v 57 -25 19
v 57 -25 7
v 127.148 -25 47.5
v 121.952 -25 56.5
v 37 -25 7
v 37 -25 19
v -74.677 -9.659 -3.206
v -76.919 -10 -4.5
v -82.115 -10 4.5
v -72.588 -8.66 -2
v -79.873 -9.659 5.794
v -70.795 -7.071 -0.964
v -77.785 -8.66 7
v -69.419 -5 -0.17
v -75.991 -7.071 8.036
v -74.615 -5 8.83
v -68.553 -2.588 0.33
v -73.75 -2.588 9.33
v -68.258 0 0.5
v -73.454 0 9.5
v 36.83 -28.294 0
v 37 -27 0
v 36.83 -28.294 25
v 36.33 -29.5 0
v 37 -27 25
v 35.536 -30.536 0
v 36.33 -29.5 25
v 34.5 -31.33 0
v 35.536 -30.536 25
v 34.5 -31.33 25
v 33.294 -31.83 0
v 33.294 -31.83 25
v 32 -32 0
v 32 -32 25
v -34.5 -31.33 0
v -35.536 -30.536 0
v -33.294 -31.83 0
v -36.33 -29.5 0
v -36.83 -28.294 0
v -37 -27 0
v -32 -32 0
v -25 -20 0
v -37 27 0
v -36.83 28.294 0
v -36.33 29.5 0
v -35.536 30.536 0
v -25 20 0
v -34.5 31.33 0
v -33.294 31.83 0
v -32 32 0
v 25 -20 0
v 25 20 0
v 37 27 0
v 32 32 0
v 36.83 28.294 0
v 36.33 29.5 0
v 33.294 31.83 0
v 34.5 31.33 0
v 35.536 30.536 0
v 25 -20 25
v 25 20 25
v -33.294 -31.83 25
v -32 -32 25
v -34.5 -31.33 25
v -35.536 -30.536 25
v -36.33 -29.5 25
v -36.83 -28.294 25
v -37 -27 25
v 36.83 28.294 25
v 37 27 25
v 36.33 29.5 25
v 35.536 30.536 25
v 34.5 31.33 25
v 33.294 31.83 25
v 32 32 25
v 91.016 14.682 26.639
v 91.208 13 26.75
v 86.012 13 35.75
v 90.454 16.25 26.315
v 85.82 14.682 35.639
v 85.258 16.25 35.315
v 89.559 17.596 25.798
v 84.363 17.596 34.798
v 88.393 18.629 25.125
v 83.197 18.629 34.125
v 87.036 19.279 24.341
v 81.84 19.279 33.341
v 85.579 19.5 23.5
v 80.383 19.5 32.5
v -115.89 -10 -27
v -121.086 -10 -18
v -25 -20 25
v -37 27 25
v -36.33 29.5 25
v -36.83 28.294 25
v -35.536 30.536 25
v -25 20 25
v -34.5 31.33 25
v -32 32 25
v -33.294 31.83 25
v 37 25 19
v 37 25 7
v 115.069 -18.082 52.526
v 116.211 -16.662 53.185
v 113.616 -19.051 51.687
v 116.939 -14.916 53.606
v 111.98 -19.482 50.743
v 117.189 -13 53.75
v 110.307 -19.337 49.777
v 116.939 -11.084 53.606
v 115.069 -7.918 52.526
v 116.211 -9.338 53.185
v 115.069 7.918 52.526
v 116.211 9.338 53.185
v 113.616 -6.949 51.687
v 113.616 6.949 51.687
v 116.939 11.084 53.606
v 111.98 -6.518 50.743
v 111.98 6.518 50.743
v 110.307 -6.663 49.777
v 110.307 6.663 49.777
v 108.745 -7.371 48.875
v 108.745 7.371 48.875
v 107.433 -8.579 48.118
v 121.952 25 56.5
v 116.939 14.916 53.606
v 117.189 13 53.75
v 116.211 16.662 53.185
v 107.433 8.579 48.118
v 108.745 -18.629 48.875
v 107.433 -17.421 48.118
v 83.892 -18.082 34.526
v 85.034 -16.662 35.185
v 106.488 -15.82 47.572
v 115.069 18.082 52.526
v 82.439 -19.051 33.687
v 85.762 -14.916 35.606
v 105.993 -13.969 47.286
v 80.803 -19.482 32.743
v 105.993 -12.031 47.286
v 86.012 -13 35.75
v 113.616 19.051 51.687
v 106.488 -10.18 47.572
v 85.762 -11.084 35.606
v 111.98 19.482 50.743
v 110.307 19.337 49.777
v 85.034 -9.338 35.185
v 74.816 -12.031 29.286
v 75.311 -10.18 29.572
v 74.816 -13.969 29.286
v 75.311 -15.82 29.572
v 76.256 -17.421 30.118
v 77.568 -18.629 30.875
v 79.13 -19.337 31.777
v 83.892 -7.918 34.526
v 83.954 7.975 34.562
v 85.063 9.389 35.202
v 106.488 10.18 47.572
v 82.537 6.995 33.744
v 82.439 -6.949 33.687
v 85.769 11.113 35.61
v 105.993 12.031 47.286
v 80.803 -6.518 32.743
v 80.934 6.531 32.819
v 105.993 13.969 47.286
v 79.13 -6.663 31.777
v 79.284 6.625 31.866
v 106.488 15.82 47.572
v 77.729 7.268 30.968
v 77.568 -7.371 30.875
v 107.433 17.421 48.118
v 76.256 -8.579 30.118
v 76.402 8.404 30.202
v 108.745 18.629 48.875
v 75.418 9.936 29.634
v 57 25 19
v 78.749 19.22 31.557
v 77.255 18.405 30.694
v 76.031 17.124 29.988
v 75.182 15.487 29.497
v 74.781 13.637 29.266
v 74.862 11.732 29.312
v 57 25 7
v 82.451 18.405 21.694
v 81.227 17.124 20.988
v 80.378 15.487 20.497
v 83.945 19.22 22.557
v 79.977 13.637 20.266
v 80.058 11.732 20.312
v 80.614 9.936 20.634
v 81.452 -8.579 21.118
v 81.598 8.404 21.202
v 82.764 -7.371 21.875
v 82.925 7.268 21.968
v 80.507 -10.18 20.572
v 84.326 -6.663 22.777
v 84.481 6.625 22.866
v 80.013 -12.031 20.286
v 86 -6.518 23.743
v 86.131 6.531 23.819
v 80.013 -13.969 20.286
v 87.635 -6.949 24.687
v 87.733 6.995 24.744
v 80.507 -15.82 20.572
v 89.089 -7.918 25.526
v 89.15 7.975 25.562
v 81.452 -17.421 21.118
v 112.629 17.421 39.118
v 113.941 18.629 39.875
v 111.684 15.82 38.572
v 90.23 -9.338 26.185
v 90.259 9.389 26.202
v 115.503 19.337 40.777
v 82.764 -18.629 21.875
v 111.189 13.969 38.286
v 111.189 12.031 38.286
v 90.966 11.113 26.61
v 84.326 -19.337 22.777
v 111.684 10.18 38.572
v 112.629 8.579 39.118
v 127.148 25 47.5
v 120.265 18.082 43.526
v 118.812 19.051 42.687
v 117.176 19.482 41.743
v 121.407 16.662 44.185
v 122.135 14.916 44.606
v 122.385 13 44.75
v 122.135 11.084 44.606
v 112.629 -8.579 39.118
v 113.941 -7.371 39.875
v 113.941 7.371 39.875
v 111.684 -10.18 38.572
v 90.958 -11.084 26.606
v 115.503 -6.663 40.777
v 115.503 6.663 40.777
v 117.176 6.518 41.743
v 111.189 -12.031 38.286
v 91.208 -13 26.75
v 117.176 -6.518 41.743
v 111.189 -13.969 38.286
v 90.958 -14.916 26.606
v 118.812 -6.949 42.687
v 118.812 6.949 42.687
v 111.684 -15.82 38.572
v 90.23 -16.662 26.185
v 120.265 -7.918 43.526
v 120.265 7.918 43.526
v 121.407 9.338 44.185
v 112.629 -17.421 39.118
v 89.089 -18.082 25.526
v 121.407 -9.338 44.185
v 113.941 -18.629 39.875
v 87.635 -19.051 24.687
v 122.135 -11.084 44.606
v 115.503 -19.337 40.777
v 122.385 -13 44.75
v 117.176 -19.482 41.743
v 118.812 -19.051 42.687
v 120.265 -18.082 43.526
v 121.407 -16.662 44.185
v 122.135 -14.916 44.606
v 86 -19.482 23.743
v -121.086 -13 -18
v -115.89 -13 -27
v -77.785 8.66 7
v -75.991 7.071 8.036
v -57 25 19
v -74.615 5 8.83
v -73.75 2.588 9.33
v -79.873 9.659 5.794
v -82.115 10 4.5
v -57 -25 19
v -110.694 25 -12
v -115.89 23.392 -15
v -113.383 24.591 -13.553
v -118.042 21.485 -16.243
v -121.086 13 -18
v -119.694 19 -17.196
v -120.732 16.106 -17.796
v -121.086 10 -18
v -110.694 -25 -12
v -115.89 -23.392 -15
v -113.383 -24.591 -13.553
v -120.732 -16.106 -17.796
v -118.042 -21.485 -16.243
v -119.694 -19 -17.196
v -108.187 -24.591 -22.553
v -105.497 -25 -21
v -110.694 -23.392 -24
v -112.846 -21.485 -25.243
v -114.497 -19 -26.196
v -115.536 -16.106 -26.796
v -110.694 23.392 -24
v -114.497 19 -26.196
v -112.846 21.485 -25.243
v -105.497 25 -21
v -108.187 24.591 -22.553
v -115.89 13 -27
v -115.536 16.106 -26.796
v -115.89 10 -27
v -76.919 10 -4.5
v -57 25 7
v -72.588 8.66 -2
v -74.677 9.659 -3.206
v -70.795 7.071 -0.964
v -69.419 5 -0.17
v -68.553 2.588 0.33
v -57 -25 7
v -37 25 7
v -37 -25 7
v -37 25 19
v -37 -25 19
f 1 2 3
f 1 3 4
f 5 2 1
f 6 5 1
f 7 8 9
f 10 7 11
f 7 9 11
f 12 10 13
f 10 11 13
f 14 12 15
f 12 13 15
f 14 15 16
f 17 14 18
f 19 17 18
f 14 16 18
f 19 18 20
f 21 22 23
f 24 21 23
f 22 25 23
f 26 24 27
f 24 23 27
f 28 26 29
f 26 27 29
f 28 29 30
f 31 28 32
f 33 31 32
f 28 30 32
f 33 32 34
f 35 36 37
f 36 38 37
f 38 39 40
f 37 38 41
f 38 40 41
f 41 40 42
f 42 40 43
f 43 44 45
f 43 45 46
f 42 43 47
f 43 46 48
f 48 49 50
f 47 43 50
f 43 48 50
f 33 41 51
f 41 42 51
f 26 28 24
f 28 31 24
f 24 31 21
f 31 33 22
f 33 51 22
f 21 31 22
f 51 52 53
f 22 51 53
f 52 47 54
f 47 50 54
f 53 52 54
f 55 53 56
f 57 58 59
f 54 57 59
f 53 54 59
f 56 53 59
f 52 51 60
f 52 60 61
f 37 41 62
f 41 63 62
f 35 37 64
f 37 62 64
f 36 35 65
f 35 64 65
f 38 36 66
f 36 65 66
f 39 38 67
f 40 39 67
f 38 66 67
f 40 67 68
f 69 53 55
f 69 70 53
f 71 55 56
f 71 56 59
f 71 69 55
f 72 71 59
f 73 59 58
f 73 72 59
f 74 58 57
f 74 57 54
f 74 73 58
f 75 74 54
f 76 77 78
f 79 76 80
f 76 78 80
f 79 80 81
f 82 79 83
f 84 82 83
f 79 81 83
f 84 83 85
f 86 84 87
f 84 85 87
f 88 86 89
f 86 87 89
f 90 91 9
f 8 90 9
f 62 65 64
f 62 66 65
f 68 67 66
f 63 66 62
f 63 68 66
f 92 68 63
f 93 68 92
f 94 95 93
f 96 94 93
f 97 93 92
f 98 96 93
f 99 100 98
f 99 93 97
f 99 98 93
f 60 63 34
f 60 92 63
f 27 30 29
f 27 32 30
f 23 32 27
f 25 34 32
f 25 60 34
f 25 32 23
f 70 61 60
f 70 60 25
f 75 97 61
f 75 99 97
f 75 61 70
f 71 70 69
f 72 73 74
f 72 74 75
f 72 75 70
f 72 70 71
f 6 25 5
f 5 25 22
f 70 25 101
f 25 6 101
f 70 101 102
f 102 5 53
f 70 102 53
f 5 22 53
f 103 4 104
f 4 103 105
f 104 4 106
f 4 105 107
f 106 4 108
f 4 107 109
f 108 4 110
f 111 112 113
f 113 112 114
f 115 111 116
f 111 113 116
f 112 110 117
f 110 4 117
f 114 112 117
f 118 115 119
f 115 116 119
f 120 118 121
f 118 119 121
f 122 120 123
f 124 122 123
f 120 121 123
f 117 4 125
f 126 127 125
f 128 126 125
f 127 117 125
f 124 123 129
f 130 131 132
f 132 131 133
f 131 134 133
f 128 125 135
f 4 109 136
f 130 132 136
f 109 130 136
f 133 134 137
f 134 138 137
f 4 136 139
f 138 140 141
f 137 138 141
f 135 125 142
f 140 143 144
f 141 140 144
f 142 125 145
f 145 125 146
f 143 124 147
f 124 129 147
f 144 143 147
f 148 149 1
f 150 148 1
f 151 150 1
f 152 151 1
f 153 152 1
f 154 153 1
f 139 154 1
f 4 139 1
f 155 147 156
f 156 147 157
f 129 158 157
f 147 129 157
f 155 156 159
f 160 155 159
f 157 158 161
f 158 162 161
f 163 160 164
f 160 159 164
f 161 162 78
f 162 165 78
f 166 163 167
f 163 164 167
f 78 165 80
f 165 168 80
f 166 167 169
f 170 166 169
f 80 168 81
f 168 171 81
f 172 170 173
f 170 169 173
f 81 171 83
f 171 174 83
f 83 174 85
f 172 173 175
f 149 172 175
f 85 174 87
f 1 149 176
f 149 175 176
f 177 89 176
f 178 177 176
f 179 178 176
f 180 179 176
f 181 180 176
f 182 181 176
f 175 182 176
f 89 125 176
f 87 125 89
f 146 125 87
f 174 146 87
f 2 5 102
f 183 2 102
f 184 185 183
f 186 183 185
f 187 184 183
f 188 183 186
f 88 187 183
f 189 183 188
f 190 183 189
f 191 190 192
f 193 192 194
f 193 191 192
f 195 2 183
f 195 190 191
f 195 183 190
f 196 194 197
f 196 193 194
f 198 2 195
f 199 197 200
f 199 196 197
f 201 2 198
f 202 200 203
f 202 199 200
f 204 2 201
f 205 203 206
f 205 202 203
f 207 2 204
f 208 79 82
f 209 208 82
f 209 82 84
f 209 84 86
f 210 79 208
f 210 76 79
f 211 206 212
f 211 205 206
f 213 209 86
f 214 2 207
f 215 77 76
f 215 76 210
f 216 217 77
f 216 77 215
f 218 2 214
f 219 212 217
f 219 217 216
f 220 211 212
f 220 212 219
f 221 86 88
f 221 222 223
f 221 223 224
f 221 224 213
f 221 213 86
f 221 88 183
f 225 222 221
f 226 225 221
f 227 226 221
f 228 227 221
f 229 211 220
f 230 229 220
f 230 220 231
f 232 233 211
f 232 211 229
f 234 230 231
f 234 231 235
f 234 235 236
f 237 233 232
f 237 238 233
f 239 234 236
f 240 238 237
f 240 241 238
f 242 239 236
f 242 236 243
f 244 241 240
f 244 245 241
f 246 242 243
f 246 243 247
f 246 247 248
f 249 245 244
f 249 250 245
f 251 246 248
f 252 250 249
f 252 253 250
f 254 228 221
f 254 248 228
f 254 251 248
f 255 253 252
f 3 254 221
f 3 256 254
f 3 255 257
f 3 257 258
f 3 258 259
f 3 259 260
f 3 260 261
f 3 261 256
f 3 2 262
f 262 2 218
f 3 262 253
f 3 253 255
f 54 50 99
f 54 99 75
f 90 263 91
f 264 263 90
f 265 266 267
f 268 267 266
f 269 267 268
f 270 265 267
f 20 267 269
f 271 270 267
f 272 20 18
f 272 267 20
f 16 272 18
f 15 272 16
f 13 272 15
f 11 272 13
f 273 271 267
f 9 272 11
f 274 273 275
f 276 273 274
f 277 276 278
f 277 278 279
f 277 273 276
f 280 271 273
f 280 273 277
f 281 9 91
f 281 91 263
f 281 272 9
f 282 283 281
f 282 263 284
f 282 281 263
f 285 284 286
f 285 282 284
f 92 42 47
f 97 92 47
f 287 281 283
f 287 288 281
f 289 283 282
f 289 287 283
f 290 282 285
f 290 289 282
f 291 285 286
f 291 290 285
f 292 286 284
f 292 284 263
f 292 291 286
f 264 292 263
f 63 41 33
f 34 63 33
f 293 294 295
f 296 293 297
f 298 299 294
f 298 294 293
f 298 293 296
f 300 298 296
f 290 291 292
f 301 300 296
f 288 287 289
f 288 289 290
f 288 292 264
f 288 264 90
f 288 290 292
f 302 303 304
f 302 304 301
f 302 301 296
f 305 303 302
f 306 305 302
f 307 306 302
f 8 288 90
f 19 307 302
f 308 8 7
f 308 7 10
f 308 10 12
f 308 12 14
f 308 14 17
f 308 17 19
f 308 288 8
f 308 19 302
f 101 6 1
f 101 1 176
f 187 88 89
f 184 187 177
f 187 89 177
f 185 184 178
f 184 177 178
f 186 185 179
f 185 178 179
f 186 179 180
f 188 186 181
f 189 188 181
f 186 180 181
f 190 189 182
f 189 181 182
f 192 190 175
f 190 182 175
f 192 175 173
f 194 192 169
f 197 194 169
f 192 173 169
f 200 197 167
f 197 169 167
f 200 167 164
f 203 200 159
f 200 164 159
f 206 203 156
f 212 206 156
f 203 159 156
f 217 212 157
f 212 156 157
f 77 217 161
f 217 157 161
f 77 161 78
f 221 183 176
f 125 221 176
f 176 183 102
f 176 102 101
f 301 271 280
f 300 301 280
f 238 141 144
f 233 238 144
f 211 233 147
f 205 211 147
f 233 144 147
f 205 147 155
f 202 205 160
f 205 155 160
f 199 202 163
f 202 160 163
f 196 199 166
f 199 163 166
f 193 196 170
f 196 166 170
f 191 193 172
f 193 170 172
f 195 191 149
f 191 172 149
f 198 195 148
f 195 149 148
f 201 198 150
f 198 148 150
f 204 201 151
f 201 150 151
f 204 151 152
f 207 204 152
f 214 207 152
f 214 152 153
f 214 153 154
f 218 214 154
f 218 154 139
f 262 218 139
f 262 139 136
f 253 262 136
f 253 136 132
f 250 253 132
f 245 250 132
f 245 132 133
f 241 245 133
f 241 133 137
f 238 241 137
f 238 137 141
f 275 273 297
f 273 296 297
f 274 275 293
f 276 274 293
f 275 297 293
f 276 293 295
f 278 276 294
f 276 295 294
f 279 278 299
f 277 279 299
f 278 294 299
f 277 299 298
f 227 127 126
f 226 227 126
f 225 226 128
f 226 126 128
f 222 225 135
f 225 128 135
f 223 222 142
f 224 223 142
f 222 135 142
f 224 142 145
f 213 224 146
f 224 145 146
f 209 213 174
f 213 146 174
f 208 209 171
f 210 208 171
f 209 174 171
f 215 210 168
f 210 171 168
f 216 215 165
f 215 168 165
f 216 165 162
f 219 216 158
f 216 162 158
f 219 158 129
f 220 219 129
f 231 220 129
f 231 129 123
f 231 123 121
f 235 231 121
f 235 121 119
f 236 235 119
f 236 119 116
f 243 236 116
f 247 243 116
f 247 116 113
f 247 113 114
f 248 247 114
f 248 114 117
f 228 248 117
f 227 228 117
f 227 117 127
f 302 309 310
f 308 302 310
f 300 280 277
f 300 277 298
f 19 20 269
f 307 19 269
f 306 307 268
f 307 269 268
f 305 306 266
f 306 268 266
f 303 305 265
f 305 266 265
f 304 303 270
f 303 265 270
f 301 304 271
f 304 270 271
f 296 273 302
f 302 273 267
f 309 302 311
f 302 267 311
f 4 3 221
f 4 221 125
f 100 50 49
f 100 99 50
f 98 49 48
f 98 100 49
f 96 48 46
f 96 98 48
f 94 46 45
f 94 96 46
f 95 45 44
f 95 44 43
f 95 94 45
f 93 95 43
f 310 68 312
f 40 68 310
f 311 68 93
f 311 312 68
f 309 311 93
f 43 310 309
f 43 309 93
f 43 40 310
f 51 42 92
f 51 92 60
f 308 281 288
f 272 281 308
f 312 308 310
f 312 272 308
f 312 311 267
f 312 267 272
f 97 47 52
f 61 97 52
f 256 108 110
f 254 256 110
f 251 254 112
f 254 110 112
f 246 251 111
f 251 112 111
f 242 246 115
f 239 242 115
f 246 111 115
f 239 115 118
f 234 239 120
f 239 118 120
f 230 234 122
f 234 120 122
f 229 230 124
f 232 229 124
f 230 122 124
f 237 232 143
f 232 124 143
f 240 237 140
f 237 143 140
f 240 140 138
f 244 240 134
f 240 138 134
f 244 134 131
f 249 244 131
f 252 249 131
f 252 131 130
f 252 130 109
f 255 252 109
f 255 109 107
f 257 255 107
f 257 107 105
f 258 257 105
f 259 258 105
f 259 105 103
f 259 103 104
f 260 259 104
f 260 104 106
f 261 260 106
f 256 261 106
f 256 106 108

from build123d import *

# Parameters (mm, degrees)
F0_W           = 74
F0_H           = 64
F0_W_2         = 50
F0_H_2         = 40
F1_DEPTH       = 25
F2_W           = 50
F2_H           = 12
F3_DEPTH       = 20
F5_DEPTH       = 25
F5_DEPTH_BACK  = 25
F7_DEPTH       = 25
F8_W           = 50
F8_H           = 12
F9_DEPTH       = 20
F10_W          = 20
F10_H          = 12
F11_DEPTH      = 25
F11_DEPTH_BACK = 25
F12_R          = 6.5
F13_DEPTH      = 25
F14_R          = 5
F15_R          = 12


with BuildPart() as f1:
    # F0 (on Top) → F1 (new body)
    with BuildSketch(Plane.XY):
        Rectangle(F0_W, F0_H)
        Rectangle(F0_W_2, F0_H_2, mode=Mode.SUBTRACT)
    extrude(amount=F1_DEPTH)

    # F2 (on face) → F3 (join)
    with BuildSketch(Plane(origin=(-37, 0, 0), x_dir=(0, -1, 0), z_dir=(-1, 0, 0))):
        with Locations((0, 13)):
            Rectangle(F2_W, F2_H)
    extrude(amount=F3_DEPTH)

    # F4 (on Front) → F5 (join, two sides)
    with BuildSketch(Plane.XZ) as f5_sk:
        Polygon((-115.8897274573, -27), (-57, 7), (-57, 19), (-121.08587988, -18), align=None)
    extrude(amount=F5_DEPTH)
    extrude(f5_sk.sketch, amount=-F5_DEPTH_BACK)

    # F6 (on face) → F7 (cut)
    with BuildSketch(Plane(origin=(-22.477241336, 0, 38.9317240079), x_dir=(0.8660254038, 0, 0.5), z_dir=(-0.5, 0, 0.8660254038))):
        with BuildLine():
            ThreePointArc((-68.8634480157, -10), (-61.7923802038, -7.0710678119), (-58.8634480157, 0))
            Line((-58.8634480157, 0), (-78.8634480157, 0))
            ThreePointArc((-78.8634480157, 0), (-75.9345158276, -7.0710678119), (-68.8634480157, -10))
        make_face()
        with BuildLine():
            Line((-78.8634480157, 0), (-58.8634480157, 0))
            ThreePointArc((-58.8634480157, 0), (-61.7923802038, 7.0710678119), (-68.8634480157, 10))
            ThreePointArc((-68.8634480157, 10), (-75.9345158276, 7.0710678119), (-78.8634480157, 0))
        make_face()
        with BuildLine():
            ThreePointArc((-68.8634480157, -10), (-75.9345158276, -7.0710678119), (-78.8634480157, 0))
            Line((-78.8634480157, 0), (-113.8634480157, 0))
            Line((-113.8634480157, 0), (-113.8634480157, -10))
            Line((-113.8634480157, -10), (-68.8634480157, -10))
        make_face()
        with BuildLine():
            Line((-113.8634480157, 0), (-78.8634480157, 0))
            ThreePointArc((-78.8634480157, 0), (-75.9345158276, 7.0710678119), (-68.8634480157, 10))
            Line((-68.8634480157, 10), (-113.8634480157, 10))
            Line((-113.8634480157, 10), (-113.8634480157, 0))
        make_face()
    extrude(amount=-F7_DEPTH, mode=Mode.SUBTRACT)

    # F8 (on face) → F9 (join)
    with BuildSketch(Plane.YZ.offset(37)):
        with Locations((0, 13)):
            Rectangle(F8_W, F8_H)
    extrude(amount=F9_DEPTH)

    # F10 (on Front) → F11 (join, two sides)
    with BuildSketch(Plane.XZ) as f11_sk:
        with Locations((47, 13)):
            Rectangle(F10_W, F10_H)
        Polygon((121.9519052838, 56.5), (57, 19), (57, 7), (127.1480577065, 47.5), align=None)
    extrude(amount=F11_DEPTH)
    extrude(f11_sk.sketch, amount=-F11_DEPTH_BACK)

    # F12 (on face) → F13 (cut)
    with BuildSketch(Plane(origin=(6.022758664, 0, -10.4317240079), x_dir=(0.8660254038, 0, 0.5), z_dir=(-0.5, 0, 0.8660254038))):
        with BuildLine():
            ThreePointArc((92.3634480157, 13), (90.4596420934, 17.5961940777), (85.8634480157, 19.5))
            ThreePointArc((85.8634480157, 19.5), (81.267253938, 8.4038059223), (92.3634480157, 13))
        make_face()
        with Locations((121.8634480157, 13)):
            Circle(F12_R)
        with Locations((121.8634480157, -13)):
            Circle(F12_R)
        with Locations((85.8634480157, -13)):
            Circle(F12_R)
    extrude(amount=-F13_DEPTH, mode=Mode.SUBTRACT)

    # F14
    f14_edges = [f1.edges().sort_by_distance(p)[0] for p in [
        (-37, 32, 12.5),
        (37, 32, 12.5),
        (-37, -32, 12.5),
        (37, -32, 12.5),
    ]]
    fillet(f14_edges, radius=F14_R)

    # F15
    f15_edges = [f1.edges().sort_by_distance(p)[0] for p in [
        (-118.487804, 25, -22.5),
        (-118.487804, -25, -22.5),
    ]]
    fillet(f15_edges, radius=F15_R)


solid = f1.part
